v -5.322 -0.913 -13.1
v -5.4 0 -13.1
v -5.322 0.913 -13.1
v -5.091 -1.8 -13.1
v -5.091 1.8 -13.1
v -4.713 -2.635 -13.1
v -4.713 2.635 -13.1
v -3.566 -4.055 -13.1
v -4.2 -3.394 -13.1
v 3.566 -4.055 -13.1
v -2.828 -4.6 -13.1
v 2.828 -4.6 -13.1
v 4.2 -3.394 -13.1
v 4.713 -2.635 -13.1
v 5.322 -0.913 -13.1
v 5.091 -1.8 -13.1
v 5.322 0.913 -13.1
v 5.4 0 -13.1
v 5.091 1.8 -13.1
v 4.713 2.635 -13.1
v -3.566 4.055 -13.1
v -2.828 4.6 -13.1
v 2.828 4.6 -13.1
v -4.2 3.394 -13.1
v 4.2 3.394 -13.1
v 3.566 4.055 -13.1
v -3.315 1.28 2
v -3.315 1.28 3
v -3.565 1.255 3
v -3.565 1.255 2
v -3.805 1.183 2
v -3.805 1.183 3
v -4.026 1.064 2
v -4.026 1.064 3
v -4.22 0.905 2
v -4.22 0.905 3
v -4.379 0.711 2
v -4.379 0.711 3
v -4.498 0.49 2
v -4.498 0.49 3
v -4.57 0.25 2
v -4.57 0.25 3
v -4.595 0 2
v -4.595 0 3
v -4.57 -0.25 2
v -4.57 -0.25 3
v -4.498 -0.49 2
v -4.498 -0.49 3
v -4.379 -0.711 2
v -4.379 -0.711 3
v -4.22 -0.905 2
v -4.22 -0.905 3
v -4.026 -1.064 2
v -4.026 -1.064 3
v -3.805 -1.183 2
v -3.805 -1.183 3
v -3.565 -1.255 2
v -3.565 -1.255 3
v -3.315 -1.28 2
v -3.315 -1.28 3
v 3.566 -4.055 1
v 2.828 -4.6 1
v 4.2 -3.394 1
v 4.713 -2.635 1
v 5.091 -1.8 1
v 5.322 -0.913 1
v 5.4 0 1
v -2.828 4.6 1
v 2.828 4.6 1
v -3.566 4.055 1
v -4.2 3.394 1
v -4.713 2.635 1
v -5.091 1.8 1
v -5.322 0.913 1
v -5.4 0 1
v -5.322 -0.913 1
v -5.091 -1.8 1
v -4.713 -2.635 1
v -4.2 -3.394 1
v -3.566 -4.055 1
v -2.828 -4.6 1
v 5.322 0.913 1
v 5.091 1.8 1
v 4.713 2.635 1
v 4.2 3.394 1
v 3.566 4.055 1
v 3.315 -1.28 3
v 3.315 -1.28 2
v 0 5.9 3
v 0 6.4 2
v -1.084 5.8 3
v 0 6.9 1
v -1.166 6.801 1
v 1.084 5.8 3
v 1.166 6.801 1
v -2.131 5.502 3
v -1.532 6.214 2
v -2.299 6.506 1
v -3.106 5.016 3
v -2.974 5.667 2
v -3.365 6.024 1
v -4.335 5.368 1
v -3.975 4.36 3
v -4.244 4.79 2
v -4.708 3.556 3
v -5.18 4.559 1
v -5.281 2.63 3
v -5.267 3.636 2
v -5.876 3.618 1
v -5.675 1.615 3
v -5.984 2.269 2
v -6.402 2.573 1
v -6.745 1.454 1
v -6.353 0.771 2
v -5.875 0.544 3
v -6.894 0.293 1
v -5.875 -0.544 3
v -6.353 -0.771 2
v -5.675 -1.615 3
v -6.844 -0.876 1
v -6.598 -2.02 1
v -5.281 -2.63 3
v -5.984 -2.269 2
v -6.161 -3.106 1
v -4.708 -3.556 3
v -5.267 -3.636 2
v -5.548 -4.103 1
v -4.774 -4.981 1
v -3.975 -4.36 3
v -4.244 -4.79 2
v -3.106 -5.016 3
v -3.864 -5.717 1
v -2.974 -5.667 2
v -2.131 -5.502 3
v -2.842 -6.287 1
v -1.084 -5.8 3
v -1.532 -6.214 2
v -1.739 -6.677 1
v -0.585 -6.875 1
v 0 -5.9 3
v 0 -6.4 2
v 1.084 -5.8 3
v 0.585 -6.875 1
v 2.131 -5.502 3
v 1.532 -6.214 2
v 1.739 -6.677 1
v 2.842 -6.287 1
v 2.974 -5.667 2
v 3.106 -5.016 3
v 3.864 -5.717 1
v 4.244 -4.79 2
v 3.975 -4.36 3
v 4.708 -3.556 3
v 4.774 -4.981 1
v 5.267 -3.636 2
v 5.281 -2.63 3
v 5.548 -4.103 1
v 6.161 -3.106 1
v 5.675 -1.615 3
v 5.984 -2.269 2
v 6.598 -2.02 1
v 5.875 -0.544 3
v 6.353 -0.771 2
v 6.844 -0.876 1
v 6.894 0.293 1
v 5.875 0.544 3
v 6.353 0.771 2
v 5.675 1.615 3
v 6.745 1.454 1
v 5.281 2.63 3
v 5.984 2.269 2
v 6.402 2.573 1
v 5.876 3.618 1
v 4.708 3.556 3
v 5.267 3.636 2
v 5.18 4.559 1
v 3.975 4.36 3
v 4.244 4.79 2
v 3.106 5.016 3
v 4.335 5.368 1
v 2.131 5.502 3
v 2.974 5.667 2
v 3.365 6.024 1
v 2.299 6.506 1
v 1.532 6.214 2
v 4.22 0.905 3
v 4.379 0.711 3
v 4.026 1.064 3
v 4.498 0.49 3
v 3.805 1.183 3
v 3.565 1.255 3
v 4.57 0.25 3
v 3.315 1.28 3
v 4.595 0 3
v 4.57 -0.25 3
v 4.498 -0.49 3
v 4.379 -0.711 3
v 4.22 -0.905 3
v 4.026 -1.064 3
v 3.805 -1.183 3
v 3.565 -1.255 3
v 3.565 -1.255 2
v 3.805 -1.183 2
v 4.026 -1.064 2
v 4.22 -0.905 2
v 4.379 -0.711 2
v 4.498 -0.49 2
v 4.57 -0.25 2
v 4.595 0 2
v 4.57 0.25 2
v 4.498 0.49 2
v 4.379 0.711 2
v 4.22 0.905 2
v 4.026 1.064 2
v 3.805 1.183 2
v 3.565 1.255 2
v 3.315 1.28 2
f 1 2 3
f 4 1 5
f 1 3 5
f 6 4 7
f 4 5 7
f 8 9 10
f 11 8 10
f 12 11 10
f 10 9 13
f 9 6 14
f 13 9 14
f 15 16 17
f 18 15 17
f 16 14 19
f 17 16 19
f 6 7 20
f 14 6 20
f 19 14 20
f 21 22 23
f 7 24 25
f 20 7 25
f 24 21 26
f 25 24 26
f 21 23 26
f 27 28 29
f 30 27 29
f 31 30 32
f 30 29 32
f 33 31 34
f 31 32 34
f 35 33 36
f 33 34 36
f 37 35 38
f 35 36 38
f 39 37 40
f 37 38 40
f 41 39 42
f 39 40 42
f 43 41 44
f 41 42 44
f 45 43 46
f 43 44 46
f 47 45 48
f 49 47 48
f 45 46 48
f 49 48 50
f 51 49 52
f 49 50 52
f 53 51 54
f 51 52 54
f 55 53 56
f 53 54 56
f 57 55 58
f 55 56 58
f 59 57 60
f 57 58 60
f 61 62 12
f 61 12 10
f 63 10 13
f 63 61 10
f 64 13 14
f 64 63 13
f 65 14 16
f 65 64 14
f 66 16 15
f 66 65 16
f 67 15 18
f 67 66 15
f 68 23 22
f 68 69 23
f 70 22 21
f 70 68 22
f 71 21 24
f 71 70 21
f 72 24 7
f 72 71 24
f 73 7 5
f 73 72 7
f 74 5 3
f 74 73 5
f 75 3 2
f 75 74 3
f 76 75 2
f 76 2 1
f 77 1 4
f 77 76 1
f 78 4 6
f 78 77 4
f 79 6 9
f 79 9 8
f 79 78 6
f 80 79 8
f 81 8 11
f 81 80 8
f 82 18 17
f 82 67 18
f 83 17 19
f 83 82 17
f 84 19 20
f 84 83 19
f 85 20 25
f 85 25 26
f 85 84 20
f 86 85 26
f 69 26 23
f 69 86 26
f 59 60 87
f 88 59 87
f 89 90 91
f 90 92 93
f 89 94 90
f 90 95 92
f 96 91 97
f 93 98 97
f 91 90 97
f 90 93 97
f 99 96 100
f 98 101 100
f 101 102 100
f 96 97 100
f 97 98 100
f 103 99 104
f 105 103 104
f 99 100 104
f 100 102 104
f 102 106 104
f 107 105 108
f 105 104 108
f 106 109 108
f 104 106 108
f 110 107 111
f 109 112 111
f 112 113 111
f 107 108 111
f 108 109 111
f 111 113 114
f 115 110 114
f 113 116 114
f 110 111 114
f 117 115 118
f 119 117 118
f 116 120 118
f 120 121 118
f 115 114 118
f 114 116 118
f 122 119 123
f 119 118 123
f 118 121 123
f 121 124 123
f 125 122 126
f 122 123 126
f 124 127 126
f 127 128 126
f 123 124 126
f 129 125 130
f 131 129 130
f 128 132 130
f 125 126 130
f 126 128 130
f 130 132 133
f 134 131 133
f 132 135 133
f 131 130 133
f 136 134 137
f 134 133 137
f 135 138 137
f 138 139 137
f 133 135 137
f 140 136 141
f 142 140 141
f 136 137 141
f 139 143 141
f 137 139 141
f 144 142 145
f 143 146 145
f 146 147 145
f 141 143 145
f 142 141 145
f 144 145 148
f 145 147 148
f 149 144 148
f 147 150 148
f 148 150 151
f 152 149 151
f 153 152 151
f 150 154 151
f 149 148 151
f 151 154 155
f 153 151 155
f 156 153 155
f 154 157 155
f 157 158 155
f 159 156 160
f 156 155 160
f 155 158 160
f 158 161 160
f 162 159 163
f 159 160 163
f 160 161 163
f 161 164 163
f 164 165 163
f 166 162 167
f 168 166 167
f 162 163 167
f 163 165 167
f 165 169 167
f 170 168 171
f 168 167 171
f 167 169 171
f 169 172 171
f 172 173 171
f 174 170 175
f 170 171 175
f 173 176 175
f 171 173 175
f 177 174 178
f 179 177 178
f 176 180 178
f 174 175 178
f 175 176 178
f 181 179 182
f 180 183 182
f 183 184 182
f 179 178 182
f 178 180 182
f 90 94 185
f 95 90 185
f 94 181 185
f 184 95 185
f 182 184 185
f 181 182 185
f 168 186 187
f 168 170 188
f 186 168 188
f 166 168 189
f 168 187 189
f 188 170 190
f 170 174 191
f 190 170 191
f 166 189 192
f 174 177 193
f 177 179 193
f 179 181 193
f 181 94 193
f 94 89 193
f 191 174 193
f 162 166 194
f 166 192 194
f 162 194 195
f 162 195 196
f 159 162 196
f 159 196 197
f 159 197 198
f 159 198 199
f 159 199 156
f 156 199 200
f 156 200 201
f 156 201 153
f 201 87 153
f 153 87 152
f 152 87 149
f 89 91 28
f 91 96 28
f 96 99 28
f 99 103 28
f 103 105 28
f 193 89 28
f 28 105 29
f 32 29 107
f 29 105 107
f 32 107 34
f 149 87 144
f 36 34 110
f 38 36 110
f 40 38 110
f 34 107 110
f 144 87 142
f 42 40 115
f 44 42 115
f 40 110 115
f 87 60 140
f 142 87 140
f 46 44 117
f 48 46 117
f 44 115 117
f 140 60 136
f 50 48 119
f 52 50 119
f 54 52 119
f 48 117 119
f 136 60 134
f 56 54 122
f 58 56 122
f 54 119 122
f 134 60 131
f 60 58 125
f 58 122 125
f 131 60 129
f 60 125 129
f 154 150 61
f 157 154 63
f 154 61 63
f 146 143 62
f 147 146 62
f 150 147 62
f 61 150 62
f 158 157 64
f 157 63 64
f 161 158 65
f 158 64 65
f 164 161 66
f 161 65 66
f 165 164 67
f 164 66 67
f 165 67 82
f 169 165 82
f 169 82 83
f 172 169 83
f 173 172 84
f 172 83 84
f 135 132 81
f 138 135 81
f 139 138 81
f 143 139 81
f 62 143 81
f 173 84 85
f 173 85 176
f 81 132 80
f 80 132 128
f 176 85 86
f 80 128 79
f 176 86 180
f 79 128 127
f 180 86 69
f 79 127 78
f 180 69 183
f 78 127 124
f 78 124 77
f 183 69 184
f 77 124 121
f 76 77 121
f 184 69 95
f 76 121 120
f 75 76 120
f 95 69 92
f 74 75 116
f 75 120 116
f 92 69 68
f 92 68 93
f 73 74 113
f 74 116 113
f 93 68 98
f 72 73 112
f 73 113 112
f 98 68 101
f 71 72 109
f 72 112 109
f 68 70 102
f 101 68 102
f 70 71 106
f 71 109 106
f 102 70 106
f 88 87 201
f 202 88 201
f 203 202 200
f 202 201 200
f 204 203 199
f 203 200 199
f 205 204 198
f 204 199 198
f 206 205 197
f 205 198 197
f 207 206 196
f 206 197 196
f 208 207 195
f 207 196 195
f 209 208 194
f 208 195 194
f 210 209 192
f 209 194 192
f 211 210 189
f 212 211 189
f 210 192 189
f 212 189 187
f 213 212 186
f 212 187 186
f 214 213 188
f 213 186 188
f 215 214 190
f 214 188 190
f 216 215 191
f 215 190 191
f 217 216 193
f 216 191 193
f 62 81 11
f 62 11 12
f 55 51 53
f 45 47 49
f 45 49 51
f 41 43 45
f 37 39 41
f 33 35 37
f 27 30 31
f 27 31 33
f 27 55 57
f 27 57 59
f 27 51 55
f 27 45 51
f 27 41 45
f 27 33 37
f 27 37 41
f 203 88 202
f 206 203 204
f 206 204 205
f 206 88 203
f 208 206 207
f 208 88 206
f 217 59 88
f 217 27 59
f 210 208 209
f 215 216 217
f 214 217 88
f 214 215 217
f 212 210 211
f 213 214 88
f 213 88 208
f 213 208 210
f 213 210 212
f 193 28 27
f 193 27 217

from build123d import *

# Parameters (mm, degrees)
PAD008_DEPTH    = 1
PAD009_DEPTH    = 13.1
POCKET001_DEPTH = 1


with BuildPart() as part:
    # Sketch012 → Pad008 (new body)
    with BuildSketch(Plane.XY):
        with BuildLine():
            ThreePointArc((-2.828427, 4.6), (-4.713465, 2.635004), (-5.4, 0))
            ThreePointArc((-5.4, 0), (-4.713465, -2.635004), (-2.828427, -4.6))
            Line((0, -4.6), (-2.828427, -4.6))
            Line((0, -4.6), (2.828427, -4.6))
            ThreePointArc((2.828427, -4.6), (4.713465, -2.635004), (5.4, 0))
            ThreePointArc((5.4, 0), (4.713465, 2.635004), (2.828427, 4.6))
            Line((0, 4.6), (2.828427, 4.6))
            Line((0, 4.6), (-2.828427, 4.6))
        make_face()
    extrude(amount=PAD008_DEPTH)

    # Sketch013 → Pad009 (join)
    with BuildSketch(Plane.XY):
        with BuildLine():
            ThreePointArc((-2.828427, 4.6), (-4.713465, 2.635004), (-5.4, 0))
            ThreePointArc((-5.4, 0), (-4.713465, -2.635004), (-2.828427, -4.6))
            Line((0, -4.6), (-2.828427, -4.6))
            Line((0, -4.6), (2.828427, -4.6))
            ThreePointArc((2.828427, -4.6), (4.713465, -2.635004), (5.4, 0))
            ThreePointArc((5.4, 0), (4.713465, 2.635004), (2.828427, 4.6))
            Line((0, 4.6), (2.828427, 4.6))
            Line((0, 4.6), (-2.828427, 4.6))
        make_face()
    extrude(amount=-PAD009_DEPTH)

    # Sketch014 → Revolution002 (revolve)
    with BuildSketch(Plane.YZ):
        Polygon((0, 1), (0, 3), (5.9, 3), (6.9, 1), align=None)
    revolve(axis=Axis((0, 0, 0), (0, 0, 1)))

    # Sketch015 (on Face1 of Revolution002) → Pocket001 (cut)
    with BuildSketch(Plane.XY.offset(3)):
        with BuildLine():
            ThreePointArc((-3.315, 1.28), (-4.595, 0), (-3.315, -1.28))
            Line((-3.315, -1.28), (3.315, -1.28))
            ThreePointArc((3.315, -1.28), (4.595, 0), (3.315, 1.28))
            Line((-3.315, 1.28), (3.315, 1.28))
        make_face()
    extrude(amount=-POCKET001_DEPTH, mode=Mode.SUBTRACT)


solid = part.part
